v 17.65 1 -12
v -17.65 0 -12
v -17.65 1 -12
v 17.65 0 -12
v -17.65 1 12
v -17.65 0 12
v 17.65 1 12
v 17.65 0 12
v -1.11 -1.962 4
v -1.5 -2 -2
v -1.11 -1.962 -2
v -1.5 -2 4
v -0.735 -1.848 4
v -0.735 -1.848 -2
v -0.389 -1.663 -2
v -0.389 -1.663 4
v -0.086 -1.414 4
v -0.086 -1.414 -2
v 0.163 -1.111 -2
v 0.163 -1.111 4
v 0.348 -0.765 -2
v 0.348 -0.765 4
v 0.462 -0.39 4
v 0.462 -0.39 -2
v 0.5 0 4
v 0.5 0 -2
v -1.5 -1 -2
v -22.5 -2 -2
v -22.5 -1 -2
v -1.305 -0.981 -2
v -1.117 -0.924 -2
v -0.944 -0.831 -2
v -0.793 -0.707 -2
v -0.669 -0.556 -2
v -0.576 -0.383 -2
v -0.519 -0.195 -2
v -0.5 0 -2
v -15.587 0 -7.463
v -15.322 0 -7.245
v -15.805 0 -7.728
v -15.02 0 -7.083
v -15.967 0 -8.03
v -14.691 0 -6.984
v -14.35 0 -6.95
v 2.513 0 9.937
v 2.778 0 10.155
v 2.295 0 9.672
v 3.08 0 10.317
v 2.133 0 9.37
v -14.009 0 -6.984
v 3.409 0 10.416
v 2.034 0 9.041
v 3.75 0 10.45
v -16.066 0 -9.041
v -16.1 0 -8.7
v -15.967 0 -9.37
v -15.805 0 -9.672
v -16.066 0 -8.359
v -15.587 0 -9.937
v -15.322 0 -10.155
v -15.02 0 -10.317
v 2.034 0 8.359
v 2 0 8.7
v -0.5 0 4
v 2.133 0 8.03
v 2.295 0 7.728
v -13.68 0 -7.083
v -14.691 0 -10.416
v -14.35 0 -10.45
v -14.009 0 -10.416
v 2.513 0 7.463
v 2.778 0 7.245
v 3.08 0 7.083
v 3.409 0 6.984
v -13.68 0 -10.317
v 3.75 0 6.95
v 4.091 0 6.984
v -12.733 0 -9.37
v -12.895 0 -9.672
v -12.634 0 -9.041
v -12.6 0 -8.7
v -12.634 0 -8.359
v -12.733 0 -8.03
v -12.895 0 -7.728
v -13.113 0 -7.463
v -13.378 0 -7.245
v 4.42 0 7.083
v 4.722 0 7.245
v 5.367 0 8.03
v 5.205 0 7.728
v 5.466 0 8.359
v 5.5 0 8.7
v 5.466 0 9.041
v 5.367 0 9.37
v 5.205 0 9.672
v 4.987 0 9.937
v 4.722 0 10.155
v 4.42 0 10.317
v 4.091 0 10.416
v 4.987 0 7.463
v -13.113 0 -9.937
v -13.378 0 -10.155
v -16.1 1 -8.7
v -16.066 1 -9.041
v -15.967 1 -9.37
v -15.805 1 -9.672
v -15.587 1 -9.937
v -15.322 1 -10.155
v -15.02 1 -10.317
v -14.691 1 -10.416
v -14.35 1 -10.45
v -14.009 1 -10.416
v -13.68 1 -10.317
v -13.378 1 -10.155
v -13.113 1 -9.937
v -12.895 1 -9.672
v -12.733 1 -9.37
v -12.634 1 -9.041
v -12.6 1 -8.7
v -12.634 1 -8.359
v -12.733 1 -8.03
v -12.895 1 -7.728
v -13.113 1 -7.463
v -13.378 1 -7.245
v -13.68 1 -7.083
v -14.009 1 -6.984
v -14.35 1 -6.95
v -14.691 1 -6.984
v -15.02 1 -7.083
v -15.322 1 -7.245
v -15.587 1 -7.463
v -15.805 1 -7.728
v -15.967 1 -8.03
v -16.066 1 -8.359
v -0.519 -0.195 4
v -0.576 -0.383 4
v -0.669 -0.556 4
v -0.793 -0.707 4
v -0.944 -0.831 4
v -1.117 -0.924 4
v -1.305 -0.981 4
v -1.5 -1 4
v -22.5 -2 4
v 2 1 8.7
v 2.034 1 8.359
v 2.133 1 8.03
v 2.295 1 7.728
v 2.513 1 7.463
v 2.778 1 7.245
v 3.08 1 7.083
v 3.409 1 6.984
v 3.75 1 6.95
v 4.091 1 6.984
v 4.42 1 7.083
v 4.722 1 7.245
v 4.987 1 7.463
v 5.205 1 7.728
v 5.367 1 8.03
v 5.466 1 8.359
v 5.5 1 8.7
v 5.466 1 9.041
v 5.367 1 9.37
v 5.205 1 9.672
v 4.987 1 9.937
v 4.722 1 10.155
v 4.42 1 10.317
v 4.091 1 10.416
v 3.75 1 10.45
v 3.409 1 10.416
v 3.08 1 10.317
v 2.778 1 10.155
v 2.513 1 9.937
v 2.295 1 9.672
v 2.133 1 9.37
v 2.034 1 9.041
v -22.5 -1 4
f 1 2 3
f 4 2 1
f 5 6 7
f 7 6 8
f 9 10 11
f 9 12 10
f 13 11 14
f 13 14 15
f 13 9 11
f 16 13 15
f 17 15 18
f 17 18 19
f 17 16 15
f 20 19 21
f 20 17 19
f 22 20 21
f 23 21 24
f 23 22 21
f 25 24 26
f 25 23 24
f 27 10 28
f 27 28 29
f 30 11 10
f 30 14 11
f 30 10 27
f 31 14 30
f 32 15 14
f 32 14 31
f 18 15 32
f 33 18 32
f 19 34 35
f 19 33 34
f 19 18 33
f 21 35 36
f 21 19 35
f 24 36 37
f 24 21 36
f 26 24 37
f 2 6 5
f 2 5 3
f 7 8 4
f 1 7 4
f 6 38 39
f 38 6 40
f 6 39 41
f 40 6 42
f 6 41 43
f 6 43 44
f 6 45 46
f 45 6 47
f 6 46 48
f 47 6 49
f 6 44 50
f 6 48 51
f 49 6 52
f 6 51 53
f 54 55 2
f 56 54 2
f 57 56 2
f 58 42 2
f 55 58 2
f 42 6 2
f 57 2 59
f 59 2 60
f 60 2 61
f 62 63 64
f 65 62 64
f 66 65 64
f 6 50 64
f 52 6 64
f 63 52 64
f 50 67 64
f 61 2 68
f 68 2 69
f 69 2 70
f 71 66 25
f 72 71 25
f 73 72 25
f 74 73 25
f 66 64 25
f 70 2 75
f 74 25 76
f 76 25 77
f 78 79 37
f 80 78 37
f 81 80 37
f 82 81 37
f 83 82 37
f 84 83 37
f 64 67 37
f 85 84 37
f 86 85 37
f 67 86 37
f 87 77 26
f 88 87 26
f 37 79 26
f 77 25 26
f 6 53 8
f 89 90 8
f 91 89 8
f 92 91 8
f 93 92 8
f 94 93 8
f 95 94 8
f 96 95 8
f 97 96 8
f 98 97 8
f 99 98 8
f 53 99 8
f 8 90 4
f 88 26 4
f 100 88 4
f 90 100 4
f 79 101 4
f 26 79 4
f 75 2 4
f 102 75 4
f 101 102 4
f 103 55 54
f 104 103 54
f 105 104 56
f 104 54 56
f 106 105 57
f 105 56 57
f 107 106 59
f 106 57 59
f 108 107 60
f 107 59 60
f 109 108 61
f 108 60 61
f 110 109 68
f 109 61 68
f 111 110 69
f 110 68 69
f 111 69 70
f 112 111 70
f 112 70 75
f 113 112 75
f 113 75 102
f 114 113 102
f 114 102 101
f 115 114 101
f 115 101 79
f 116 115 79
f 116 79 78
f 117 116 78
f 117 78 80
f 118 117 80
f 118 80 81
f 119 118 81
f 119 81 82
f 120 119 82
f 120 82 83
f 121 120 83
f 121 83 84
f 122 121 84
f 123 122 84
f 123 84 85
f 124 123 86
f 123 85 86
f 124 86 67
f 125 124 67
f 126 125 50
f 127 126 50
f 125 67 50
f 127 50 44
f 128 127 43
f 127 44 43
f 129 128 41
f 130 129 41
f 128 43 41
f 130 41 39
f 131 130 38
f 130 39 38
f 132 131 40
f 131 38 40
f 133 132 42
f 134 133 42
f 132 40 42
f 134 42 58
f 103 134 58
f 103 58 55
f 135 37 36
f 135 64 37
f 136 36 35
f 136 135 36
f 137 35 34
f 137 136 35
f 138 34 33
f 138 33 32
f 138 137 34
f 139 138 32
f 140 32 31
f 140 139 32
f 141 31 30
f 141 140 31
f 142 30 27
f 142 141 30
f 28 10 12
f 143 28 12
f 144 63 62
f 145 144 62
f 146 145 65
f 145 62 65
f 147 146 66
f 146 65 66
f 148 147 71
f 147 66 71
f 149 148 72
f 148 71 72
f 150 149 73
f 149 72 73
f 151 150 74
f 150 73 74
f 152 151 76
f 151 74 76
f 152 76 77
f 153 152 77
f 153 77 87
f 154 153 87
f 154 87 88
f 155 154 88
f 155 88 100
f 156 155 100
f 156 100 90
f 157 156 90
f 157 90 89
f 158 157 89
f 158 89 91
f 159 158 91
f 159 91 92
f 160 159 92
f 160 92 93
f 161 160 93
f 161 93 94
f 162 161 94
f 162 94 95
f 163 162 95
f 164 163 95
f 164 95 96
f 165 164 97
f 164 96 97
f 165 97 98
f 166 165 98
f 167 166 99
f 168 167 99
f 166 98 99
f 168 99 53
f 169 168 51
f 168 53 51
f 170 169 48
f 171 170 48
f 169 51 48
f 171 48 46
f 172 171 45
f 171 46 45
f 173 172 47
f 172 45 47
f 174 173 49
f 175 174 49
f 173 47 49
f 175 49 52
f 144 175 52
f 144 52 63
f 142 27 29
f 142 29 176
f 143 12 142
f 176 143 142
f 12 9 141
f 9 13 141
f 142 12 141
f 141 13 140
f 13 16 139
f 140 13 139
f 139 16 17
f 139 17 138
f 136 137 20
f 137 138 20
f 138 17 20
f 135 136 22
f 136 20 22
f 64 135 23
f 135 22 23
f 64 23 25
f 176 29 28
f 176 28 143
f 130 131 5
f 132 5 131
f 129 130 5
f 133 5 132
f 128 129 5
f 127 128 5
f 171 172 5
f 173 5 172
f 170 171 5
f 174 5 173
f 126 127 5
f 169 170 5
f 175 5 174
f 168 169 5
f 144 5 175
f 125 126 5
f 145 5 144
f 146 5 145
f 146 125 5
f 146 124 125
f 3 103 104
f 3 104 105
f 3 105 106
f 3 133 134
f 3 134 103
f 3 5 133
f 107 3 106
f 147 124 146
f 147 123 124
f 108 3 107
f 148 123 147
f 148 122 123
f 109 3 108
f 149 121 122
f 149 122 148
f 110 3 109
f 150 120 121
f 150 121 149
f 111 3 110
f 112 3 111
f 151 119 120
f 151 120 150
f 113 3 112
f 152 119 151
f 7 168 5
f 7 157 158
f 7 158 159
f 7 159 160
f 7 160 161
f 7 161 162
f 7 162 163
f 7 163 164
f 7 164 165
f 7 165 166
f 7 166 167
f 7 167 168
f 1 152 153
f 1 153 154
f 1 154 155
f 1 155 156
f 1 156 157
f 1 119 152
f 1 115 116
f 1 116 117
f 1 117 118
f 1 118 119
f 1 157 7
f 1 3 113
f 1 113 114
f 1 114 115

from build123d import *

# Parameters (mm, degrees)
SKETCH1_W                  = 35.3
SKETCH1_H                  = 24
BOSS_EXTRUDE1_DEPTH        = 1
F_3_5_3_5_DIAMETER_HOLE1_D = 3.5
SKETCH5_W                  = 1
SKETCH5_H                  = 6
BOSS_EXTRUDE2_DEPTH        = 2
SKETCH6_W                  = 6
SKETCH6_H                  = 1
BOSS_EXTRUDE3_DEPTH        = 22
FILLET1_R                  = 1
FILLET2_R                  = 2


with BuildPart() as part:
    # Sketch1 → Boss-Extrude1 (new body)
    with BuildSketch(Plane(origin=(0, 0, 0), x_dir=(1, 0, 0), z_dir=(0, 1, 0))):
        Rectangle(SKETCH1_W, SKETCH1_H)
    extrude(amount=BOSS_EXTRUDE1_DEPTH)

    # Ø3.5 (3.5) Diameter Hole1 (through all)
    with Locations(Plane(origin=(0, 1, 0), x_dir=(1, 0, 0), z_dir=(0, 1, 0))):
        with Locations((-14.35, 8.7), (3.75, -8.7)):
            Hole(F_3_5_3_5_DIAMETER_HOLE1_D / 2)

    # Sketch5 → Boss-Extrude2 (add)
    with BuildSketch(Plane.XZ):
        with Locations((0, 1)):
            Rectangle(SKETCH5_W, SKETCH5_H)
    extrude(amount=BOSS_EXTRUDE2_DEPTH)

    # Sketch6 → Boss-Extrude3 (add)
    with BuildSketch(Plane.ZY.offset(0.5)):
        with Locations((1, -1.5)):
            Rectangle(SKETCH6_W, SKETCH6_H)
    extrude(amount=BOSS_EXTRUDE3_DEPTH)

    # Fillet1
    fillet1_edges = [part.edges().sort_by_distance(p)[0] for p in [
        (-0.5, -1, 1),
    ]]
    fillet(fillet1_edges, radius=FILLET1_R - 0.0001)  # a hair under: the kernel refuses the full size

    # Fillet2
    fillet2_edges = [part.edges().sort_by_distance(p)[0] for p in [
        (0.5, -2, 1),
    ]]
    fillet(fillet2_edges, radius=FILLET2_R - 0.0001)  # a hair under: the kernel refuses the full size


solid = part.part
